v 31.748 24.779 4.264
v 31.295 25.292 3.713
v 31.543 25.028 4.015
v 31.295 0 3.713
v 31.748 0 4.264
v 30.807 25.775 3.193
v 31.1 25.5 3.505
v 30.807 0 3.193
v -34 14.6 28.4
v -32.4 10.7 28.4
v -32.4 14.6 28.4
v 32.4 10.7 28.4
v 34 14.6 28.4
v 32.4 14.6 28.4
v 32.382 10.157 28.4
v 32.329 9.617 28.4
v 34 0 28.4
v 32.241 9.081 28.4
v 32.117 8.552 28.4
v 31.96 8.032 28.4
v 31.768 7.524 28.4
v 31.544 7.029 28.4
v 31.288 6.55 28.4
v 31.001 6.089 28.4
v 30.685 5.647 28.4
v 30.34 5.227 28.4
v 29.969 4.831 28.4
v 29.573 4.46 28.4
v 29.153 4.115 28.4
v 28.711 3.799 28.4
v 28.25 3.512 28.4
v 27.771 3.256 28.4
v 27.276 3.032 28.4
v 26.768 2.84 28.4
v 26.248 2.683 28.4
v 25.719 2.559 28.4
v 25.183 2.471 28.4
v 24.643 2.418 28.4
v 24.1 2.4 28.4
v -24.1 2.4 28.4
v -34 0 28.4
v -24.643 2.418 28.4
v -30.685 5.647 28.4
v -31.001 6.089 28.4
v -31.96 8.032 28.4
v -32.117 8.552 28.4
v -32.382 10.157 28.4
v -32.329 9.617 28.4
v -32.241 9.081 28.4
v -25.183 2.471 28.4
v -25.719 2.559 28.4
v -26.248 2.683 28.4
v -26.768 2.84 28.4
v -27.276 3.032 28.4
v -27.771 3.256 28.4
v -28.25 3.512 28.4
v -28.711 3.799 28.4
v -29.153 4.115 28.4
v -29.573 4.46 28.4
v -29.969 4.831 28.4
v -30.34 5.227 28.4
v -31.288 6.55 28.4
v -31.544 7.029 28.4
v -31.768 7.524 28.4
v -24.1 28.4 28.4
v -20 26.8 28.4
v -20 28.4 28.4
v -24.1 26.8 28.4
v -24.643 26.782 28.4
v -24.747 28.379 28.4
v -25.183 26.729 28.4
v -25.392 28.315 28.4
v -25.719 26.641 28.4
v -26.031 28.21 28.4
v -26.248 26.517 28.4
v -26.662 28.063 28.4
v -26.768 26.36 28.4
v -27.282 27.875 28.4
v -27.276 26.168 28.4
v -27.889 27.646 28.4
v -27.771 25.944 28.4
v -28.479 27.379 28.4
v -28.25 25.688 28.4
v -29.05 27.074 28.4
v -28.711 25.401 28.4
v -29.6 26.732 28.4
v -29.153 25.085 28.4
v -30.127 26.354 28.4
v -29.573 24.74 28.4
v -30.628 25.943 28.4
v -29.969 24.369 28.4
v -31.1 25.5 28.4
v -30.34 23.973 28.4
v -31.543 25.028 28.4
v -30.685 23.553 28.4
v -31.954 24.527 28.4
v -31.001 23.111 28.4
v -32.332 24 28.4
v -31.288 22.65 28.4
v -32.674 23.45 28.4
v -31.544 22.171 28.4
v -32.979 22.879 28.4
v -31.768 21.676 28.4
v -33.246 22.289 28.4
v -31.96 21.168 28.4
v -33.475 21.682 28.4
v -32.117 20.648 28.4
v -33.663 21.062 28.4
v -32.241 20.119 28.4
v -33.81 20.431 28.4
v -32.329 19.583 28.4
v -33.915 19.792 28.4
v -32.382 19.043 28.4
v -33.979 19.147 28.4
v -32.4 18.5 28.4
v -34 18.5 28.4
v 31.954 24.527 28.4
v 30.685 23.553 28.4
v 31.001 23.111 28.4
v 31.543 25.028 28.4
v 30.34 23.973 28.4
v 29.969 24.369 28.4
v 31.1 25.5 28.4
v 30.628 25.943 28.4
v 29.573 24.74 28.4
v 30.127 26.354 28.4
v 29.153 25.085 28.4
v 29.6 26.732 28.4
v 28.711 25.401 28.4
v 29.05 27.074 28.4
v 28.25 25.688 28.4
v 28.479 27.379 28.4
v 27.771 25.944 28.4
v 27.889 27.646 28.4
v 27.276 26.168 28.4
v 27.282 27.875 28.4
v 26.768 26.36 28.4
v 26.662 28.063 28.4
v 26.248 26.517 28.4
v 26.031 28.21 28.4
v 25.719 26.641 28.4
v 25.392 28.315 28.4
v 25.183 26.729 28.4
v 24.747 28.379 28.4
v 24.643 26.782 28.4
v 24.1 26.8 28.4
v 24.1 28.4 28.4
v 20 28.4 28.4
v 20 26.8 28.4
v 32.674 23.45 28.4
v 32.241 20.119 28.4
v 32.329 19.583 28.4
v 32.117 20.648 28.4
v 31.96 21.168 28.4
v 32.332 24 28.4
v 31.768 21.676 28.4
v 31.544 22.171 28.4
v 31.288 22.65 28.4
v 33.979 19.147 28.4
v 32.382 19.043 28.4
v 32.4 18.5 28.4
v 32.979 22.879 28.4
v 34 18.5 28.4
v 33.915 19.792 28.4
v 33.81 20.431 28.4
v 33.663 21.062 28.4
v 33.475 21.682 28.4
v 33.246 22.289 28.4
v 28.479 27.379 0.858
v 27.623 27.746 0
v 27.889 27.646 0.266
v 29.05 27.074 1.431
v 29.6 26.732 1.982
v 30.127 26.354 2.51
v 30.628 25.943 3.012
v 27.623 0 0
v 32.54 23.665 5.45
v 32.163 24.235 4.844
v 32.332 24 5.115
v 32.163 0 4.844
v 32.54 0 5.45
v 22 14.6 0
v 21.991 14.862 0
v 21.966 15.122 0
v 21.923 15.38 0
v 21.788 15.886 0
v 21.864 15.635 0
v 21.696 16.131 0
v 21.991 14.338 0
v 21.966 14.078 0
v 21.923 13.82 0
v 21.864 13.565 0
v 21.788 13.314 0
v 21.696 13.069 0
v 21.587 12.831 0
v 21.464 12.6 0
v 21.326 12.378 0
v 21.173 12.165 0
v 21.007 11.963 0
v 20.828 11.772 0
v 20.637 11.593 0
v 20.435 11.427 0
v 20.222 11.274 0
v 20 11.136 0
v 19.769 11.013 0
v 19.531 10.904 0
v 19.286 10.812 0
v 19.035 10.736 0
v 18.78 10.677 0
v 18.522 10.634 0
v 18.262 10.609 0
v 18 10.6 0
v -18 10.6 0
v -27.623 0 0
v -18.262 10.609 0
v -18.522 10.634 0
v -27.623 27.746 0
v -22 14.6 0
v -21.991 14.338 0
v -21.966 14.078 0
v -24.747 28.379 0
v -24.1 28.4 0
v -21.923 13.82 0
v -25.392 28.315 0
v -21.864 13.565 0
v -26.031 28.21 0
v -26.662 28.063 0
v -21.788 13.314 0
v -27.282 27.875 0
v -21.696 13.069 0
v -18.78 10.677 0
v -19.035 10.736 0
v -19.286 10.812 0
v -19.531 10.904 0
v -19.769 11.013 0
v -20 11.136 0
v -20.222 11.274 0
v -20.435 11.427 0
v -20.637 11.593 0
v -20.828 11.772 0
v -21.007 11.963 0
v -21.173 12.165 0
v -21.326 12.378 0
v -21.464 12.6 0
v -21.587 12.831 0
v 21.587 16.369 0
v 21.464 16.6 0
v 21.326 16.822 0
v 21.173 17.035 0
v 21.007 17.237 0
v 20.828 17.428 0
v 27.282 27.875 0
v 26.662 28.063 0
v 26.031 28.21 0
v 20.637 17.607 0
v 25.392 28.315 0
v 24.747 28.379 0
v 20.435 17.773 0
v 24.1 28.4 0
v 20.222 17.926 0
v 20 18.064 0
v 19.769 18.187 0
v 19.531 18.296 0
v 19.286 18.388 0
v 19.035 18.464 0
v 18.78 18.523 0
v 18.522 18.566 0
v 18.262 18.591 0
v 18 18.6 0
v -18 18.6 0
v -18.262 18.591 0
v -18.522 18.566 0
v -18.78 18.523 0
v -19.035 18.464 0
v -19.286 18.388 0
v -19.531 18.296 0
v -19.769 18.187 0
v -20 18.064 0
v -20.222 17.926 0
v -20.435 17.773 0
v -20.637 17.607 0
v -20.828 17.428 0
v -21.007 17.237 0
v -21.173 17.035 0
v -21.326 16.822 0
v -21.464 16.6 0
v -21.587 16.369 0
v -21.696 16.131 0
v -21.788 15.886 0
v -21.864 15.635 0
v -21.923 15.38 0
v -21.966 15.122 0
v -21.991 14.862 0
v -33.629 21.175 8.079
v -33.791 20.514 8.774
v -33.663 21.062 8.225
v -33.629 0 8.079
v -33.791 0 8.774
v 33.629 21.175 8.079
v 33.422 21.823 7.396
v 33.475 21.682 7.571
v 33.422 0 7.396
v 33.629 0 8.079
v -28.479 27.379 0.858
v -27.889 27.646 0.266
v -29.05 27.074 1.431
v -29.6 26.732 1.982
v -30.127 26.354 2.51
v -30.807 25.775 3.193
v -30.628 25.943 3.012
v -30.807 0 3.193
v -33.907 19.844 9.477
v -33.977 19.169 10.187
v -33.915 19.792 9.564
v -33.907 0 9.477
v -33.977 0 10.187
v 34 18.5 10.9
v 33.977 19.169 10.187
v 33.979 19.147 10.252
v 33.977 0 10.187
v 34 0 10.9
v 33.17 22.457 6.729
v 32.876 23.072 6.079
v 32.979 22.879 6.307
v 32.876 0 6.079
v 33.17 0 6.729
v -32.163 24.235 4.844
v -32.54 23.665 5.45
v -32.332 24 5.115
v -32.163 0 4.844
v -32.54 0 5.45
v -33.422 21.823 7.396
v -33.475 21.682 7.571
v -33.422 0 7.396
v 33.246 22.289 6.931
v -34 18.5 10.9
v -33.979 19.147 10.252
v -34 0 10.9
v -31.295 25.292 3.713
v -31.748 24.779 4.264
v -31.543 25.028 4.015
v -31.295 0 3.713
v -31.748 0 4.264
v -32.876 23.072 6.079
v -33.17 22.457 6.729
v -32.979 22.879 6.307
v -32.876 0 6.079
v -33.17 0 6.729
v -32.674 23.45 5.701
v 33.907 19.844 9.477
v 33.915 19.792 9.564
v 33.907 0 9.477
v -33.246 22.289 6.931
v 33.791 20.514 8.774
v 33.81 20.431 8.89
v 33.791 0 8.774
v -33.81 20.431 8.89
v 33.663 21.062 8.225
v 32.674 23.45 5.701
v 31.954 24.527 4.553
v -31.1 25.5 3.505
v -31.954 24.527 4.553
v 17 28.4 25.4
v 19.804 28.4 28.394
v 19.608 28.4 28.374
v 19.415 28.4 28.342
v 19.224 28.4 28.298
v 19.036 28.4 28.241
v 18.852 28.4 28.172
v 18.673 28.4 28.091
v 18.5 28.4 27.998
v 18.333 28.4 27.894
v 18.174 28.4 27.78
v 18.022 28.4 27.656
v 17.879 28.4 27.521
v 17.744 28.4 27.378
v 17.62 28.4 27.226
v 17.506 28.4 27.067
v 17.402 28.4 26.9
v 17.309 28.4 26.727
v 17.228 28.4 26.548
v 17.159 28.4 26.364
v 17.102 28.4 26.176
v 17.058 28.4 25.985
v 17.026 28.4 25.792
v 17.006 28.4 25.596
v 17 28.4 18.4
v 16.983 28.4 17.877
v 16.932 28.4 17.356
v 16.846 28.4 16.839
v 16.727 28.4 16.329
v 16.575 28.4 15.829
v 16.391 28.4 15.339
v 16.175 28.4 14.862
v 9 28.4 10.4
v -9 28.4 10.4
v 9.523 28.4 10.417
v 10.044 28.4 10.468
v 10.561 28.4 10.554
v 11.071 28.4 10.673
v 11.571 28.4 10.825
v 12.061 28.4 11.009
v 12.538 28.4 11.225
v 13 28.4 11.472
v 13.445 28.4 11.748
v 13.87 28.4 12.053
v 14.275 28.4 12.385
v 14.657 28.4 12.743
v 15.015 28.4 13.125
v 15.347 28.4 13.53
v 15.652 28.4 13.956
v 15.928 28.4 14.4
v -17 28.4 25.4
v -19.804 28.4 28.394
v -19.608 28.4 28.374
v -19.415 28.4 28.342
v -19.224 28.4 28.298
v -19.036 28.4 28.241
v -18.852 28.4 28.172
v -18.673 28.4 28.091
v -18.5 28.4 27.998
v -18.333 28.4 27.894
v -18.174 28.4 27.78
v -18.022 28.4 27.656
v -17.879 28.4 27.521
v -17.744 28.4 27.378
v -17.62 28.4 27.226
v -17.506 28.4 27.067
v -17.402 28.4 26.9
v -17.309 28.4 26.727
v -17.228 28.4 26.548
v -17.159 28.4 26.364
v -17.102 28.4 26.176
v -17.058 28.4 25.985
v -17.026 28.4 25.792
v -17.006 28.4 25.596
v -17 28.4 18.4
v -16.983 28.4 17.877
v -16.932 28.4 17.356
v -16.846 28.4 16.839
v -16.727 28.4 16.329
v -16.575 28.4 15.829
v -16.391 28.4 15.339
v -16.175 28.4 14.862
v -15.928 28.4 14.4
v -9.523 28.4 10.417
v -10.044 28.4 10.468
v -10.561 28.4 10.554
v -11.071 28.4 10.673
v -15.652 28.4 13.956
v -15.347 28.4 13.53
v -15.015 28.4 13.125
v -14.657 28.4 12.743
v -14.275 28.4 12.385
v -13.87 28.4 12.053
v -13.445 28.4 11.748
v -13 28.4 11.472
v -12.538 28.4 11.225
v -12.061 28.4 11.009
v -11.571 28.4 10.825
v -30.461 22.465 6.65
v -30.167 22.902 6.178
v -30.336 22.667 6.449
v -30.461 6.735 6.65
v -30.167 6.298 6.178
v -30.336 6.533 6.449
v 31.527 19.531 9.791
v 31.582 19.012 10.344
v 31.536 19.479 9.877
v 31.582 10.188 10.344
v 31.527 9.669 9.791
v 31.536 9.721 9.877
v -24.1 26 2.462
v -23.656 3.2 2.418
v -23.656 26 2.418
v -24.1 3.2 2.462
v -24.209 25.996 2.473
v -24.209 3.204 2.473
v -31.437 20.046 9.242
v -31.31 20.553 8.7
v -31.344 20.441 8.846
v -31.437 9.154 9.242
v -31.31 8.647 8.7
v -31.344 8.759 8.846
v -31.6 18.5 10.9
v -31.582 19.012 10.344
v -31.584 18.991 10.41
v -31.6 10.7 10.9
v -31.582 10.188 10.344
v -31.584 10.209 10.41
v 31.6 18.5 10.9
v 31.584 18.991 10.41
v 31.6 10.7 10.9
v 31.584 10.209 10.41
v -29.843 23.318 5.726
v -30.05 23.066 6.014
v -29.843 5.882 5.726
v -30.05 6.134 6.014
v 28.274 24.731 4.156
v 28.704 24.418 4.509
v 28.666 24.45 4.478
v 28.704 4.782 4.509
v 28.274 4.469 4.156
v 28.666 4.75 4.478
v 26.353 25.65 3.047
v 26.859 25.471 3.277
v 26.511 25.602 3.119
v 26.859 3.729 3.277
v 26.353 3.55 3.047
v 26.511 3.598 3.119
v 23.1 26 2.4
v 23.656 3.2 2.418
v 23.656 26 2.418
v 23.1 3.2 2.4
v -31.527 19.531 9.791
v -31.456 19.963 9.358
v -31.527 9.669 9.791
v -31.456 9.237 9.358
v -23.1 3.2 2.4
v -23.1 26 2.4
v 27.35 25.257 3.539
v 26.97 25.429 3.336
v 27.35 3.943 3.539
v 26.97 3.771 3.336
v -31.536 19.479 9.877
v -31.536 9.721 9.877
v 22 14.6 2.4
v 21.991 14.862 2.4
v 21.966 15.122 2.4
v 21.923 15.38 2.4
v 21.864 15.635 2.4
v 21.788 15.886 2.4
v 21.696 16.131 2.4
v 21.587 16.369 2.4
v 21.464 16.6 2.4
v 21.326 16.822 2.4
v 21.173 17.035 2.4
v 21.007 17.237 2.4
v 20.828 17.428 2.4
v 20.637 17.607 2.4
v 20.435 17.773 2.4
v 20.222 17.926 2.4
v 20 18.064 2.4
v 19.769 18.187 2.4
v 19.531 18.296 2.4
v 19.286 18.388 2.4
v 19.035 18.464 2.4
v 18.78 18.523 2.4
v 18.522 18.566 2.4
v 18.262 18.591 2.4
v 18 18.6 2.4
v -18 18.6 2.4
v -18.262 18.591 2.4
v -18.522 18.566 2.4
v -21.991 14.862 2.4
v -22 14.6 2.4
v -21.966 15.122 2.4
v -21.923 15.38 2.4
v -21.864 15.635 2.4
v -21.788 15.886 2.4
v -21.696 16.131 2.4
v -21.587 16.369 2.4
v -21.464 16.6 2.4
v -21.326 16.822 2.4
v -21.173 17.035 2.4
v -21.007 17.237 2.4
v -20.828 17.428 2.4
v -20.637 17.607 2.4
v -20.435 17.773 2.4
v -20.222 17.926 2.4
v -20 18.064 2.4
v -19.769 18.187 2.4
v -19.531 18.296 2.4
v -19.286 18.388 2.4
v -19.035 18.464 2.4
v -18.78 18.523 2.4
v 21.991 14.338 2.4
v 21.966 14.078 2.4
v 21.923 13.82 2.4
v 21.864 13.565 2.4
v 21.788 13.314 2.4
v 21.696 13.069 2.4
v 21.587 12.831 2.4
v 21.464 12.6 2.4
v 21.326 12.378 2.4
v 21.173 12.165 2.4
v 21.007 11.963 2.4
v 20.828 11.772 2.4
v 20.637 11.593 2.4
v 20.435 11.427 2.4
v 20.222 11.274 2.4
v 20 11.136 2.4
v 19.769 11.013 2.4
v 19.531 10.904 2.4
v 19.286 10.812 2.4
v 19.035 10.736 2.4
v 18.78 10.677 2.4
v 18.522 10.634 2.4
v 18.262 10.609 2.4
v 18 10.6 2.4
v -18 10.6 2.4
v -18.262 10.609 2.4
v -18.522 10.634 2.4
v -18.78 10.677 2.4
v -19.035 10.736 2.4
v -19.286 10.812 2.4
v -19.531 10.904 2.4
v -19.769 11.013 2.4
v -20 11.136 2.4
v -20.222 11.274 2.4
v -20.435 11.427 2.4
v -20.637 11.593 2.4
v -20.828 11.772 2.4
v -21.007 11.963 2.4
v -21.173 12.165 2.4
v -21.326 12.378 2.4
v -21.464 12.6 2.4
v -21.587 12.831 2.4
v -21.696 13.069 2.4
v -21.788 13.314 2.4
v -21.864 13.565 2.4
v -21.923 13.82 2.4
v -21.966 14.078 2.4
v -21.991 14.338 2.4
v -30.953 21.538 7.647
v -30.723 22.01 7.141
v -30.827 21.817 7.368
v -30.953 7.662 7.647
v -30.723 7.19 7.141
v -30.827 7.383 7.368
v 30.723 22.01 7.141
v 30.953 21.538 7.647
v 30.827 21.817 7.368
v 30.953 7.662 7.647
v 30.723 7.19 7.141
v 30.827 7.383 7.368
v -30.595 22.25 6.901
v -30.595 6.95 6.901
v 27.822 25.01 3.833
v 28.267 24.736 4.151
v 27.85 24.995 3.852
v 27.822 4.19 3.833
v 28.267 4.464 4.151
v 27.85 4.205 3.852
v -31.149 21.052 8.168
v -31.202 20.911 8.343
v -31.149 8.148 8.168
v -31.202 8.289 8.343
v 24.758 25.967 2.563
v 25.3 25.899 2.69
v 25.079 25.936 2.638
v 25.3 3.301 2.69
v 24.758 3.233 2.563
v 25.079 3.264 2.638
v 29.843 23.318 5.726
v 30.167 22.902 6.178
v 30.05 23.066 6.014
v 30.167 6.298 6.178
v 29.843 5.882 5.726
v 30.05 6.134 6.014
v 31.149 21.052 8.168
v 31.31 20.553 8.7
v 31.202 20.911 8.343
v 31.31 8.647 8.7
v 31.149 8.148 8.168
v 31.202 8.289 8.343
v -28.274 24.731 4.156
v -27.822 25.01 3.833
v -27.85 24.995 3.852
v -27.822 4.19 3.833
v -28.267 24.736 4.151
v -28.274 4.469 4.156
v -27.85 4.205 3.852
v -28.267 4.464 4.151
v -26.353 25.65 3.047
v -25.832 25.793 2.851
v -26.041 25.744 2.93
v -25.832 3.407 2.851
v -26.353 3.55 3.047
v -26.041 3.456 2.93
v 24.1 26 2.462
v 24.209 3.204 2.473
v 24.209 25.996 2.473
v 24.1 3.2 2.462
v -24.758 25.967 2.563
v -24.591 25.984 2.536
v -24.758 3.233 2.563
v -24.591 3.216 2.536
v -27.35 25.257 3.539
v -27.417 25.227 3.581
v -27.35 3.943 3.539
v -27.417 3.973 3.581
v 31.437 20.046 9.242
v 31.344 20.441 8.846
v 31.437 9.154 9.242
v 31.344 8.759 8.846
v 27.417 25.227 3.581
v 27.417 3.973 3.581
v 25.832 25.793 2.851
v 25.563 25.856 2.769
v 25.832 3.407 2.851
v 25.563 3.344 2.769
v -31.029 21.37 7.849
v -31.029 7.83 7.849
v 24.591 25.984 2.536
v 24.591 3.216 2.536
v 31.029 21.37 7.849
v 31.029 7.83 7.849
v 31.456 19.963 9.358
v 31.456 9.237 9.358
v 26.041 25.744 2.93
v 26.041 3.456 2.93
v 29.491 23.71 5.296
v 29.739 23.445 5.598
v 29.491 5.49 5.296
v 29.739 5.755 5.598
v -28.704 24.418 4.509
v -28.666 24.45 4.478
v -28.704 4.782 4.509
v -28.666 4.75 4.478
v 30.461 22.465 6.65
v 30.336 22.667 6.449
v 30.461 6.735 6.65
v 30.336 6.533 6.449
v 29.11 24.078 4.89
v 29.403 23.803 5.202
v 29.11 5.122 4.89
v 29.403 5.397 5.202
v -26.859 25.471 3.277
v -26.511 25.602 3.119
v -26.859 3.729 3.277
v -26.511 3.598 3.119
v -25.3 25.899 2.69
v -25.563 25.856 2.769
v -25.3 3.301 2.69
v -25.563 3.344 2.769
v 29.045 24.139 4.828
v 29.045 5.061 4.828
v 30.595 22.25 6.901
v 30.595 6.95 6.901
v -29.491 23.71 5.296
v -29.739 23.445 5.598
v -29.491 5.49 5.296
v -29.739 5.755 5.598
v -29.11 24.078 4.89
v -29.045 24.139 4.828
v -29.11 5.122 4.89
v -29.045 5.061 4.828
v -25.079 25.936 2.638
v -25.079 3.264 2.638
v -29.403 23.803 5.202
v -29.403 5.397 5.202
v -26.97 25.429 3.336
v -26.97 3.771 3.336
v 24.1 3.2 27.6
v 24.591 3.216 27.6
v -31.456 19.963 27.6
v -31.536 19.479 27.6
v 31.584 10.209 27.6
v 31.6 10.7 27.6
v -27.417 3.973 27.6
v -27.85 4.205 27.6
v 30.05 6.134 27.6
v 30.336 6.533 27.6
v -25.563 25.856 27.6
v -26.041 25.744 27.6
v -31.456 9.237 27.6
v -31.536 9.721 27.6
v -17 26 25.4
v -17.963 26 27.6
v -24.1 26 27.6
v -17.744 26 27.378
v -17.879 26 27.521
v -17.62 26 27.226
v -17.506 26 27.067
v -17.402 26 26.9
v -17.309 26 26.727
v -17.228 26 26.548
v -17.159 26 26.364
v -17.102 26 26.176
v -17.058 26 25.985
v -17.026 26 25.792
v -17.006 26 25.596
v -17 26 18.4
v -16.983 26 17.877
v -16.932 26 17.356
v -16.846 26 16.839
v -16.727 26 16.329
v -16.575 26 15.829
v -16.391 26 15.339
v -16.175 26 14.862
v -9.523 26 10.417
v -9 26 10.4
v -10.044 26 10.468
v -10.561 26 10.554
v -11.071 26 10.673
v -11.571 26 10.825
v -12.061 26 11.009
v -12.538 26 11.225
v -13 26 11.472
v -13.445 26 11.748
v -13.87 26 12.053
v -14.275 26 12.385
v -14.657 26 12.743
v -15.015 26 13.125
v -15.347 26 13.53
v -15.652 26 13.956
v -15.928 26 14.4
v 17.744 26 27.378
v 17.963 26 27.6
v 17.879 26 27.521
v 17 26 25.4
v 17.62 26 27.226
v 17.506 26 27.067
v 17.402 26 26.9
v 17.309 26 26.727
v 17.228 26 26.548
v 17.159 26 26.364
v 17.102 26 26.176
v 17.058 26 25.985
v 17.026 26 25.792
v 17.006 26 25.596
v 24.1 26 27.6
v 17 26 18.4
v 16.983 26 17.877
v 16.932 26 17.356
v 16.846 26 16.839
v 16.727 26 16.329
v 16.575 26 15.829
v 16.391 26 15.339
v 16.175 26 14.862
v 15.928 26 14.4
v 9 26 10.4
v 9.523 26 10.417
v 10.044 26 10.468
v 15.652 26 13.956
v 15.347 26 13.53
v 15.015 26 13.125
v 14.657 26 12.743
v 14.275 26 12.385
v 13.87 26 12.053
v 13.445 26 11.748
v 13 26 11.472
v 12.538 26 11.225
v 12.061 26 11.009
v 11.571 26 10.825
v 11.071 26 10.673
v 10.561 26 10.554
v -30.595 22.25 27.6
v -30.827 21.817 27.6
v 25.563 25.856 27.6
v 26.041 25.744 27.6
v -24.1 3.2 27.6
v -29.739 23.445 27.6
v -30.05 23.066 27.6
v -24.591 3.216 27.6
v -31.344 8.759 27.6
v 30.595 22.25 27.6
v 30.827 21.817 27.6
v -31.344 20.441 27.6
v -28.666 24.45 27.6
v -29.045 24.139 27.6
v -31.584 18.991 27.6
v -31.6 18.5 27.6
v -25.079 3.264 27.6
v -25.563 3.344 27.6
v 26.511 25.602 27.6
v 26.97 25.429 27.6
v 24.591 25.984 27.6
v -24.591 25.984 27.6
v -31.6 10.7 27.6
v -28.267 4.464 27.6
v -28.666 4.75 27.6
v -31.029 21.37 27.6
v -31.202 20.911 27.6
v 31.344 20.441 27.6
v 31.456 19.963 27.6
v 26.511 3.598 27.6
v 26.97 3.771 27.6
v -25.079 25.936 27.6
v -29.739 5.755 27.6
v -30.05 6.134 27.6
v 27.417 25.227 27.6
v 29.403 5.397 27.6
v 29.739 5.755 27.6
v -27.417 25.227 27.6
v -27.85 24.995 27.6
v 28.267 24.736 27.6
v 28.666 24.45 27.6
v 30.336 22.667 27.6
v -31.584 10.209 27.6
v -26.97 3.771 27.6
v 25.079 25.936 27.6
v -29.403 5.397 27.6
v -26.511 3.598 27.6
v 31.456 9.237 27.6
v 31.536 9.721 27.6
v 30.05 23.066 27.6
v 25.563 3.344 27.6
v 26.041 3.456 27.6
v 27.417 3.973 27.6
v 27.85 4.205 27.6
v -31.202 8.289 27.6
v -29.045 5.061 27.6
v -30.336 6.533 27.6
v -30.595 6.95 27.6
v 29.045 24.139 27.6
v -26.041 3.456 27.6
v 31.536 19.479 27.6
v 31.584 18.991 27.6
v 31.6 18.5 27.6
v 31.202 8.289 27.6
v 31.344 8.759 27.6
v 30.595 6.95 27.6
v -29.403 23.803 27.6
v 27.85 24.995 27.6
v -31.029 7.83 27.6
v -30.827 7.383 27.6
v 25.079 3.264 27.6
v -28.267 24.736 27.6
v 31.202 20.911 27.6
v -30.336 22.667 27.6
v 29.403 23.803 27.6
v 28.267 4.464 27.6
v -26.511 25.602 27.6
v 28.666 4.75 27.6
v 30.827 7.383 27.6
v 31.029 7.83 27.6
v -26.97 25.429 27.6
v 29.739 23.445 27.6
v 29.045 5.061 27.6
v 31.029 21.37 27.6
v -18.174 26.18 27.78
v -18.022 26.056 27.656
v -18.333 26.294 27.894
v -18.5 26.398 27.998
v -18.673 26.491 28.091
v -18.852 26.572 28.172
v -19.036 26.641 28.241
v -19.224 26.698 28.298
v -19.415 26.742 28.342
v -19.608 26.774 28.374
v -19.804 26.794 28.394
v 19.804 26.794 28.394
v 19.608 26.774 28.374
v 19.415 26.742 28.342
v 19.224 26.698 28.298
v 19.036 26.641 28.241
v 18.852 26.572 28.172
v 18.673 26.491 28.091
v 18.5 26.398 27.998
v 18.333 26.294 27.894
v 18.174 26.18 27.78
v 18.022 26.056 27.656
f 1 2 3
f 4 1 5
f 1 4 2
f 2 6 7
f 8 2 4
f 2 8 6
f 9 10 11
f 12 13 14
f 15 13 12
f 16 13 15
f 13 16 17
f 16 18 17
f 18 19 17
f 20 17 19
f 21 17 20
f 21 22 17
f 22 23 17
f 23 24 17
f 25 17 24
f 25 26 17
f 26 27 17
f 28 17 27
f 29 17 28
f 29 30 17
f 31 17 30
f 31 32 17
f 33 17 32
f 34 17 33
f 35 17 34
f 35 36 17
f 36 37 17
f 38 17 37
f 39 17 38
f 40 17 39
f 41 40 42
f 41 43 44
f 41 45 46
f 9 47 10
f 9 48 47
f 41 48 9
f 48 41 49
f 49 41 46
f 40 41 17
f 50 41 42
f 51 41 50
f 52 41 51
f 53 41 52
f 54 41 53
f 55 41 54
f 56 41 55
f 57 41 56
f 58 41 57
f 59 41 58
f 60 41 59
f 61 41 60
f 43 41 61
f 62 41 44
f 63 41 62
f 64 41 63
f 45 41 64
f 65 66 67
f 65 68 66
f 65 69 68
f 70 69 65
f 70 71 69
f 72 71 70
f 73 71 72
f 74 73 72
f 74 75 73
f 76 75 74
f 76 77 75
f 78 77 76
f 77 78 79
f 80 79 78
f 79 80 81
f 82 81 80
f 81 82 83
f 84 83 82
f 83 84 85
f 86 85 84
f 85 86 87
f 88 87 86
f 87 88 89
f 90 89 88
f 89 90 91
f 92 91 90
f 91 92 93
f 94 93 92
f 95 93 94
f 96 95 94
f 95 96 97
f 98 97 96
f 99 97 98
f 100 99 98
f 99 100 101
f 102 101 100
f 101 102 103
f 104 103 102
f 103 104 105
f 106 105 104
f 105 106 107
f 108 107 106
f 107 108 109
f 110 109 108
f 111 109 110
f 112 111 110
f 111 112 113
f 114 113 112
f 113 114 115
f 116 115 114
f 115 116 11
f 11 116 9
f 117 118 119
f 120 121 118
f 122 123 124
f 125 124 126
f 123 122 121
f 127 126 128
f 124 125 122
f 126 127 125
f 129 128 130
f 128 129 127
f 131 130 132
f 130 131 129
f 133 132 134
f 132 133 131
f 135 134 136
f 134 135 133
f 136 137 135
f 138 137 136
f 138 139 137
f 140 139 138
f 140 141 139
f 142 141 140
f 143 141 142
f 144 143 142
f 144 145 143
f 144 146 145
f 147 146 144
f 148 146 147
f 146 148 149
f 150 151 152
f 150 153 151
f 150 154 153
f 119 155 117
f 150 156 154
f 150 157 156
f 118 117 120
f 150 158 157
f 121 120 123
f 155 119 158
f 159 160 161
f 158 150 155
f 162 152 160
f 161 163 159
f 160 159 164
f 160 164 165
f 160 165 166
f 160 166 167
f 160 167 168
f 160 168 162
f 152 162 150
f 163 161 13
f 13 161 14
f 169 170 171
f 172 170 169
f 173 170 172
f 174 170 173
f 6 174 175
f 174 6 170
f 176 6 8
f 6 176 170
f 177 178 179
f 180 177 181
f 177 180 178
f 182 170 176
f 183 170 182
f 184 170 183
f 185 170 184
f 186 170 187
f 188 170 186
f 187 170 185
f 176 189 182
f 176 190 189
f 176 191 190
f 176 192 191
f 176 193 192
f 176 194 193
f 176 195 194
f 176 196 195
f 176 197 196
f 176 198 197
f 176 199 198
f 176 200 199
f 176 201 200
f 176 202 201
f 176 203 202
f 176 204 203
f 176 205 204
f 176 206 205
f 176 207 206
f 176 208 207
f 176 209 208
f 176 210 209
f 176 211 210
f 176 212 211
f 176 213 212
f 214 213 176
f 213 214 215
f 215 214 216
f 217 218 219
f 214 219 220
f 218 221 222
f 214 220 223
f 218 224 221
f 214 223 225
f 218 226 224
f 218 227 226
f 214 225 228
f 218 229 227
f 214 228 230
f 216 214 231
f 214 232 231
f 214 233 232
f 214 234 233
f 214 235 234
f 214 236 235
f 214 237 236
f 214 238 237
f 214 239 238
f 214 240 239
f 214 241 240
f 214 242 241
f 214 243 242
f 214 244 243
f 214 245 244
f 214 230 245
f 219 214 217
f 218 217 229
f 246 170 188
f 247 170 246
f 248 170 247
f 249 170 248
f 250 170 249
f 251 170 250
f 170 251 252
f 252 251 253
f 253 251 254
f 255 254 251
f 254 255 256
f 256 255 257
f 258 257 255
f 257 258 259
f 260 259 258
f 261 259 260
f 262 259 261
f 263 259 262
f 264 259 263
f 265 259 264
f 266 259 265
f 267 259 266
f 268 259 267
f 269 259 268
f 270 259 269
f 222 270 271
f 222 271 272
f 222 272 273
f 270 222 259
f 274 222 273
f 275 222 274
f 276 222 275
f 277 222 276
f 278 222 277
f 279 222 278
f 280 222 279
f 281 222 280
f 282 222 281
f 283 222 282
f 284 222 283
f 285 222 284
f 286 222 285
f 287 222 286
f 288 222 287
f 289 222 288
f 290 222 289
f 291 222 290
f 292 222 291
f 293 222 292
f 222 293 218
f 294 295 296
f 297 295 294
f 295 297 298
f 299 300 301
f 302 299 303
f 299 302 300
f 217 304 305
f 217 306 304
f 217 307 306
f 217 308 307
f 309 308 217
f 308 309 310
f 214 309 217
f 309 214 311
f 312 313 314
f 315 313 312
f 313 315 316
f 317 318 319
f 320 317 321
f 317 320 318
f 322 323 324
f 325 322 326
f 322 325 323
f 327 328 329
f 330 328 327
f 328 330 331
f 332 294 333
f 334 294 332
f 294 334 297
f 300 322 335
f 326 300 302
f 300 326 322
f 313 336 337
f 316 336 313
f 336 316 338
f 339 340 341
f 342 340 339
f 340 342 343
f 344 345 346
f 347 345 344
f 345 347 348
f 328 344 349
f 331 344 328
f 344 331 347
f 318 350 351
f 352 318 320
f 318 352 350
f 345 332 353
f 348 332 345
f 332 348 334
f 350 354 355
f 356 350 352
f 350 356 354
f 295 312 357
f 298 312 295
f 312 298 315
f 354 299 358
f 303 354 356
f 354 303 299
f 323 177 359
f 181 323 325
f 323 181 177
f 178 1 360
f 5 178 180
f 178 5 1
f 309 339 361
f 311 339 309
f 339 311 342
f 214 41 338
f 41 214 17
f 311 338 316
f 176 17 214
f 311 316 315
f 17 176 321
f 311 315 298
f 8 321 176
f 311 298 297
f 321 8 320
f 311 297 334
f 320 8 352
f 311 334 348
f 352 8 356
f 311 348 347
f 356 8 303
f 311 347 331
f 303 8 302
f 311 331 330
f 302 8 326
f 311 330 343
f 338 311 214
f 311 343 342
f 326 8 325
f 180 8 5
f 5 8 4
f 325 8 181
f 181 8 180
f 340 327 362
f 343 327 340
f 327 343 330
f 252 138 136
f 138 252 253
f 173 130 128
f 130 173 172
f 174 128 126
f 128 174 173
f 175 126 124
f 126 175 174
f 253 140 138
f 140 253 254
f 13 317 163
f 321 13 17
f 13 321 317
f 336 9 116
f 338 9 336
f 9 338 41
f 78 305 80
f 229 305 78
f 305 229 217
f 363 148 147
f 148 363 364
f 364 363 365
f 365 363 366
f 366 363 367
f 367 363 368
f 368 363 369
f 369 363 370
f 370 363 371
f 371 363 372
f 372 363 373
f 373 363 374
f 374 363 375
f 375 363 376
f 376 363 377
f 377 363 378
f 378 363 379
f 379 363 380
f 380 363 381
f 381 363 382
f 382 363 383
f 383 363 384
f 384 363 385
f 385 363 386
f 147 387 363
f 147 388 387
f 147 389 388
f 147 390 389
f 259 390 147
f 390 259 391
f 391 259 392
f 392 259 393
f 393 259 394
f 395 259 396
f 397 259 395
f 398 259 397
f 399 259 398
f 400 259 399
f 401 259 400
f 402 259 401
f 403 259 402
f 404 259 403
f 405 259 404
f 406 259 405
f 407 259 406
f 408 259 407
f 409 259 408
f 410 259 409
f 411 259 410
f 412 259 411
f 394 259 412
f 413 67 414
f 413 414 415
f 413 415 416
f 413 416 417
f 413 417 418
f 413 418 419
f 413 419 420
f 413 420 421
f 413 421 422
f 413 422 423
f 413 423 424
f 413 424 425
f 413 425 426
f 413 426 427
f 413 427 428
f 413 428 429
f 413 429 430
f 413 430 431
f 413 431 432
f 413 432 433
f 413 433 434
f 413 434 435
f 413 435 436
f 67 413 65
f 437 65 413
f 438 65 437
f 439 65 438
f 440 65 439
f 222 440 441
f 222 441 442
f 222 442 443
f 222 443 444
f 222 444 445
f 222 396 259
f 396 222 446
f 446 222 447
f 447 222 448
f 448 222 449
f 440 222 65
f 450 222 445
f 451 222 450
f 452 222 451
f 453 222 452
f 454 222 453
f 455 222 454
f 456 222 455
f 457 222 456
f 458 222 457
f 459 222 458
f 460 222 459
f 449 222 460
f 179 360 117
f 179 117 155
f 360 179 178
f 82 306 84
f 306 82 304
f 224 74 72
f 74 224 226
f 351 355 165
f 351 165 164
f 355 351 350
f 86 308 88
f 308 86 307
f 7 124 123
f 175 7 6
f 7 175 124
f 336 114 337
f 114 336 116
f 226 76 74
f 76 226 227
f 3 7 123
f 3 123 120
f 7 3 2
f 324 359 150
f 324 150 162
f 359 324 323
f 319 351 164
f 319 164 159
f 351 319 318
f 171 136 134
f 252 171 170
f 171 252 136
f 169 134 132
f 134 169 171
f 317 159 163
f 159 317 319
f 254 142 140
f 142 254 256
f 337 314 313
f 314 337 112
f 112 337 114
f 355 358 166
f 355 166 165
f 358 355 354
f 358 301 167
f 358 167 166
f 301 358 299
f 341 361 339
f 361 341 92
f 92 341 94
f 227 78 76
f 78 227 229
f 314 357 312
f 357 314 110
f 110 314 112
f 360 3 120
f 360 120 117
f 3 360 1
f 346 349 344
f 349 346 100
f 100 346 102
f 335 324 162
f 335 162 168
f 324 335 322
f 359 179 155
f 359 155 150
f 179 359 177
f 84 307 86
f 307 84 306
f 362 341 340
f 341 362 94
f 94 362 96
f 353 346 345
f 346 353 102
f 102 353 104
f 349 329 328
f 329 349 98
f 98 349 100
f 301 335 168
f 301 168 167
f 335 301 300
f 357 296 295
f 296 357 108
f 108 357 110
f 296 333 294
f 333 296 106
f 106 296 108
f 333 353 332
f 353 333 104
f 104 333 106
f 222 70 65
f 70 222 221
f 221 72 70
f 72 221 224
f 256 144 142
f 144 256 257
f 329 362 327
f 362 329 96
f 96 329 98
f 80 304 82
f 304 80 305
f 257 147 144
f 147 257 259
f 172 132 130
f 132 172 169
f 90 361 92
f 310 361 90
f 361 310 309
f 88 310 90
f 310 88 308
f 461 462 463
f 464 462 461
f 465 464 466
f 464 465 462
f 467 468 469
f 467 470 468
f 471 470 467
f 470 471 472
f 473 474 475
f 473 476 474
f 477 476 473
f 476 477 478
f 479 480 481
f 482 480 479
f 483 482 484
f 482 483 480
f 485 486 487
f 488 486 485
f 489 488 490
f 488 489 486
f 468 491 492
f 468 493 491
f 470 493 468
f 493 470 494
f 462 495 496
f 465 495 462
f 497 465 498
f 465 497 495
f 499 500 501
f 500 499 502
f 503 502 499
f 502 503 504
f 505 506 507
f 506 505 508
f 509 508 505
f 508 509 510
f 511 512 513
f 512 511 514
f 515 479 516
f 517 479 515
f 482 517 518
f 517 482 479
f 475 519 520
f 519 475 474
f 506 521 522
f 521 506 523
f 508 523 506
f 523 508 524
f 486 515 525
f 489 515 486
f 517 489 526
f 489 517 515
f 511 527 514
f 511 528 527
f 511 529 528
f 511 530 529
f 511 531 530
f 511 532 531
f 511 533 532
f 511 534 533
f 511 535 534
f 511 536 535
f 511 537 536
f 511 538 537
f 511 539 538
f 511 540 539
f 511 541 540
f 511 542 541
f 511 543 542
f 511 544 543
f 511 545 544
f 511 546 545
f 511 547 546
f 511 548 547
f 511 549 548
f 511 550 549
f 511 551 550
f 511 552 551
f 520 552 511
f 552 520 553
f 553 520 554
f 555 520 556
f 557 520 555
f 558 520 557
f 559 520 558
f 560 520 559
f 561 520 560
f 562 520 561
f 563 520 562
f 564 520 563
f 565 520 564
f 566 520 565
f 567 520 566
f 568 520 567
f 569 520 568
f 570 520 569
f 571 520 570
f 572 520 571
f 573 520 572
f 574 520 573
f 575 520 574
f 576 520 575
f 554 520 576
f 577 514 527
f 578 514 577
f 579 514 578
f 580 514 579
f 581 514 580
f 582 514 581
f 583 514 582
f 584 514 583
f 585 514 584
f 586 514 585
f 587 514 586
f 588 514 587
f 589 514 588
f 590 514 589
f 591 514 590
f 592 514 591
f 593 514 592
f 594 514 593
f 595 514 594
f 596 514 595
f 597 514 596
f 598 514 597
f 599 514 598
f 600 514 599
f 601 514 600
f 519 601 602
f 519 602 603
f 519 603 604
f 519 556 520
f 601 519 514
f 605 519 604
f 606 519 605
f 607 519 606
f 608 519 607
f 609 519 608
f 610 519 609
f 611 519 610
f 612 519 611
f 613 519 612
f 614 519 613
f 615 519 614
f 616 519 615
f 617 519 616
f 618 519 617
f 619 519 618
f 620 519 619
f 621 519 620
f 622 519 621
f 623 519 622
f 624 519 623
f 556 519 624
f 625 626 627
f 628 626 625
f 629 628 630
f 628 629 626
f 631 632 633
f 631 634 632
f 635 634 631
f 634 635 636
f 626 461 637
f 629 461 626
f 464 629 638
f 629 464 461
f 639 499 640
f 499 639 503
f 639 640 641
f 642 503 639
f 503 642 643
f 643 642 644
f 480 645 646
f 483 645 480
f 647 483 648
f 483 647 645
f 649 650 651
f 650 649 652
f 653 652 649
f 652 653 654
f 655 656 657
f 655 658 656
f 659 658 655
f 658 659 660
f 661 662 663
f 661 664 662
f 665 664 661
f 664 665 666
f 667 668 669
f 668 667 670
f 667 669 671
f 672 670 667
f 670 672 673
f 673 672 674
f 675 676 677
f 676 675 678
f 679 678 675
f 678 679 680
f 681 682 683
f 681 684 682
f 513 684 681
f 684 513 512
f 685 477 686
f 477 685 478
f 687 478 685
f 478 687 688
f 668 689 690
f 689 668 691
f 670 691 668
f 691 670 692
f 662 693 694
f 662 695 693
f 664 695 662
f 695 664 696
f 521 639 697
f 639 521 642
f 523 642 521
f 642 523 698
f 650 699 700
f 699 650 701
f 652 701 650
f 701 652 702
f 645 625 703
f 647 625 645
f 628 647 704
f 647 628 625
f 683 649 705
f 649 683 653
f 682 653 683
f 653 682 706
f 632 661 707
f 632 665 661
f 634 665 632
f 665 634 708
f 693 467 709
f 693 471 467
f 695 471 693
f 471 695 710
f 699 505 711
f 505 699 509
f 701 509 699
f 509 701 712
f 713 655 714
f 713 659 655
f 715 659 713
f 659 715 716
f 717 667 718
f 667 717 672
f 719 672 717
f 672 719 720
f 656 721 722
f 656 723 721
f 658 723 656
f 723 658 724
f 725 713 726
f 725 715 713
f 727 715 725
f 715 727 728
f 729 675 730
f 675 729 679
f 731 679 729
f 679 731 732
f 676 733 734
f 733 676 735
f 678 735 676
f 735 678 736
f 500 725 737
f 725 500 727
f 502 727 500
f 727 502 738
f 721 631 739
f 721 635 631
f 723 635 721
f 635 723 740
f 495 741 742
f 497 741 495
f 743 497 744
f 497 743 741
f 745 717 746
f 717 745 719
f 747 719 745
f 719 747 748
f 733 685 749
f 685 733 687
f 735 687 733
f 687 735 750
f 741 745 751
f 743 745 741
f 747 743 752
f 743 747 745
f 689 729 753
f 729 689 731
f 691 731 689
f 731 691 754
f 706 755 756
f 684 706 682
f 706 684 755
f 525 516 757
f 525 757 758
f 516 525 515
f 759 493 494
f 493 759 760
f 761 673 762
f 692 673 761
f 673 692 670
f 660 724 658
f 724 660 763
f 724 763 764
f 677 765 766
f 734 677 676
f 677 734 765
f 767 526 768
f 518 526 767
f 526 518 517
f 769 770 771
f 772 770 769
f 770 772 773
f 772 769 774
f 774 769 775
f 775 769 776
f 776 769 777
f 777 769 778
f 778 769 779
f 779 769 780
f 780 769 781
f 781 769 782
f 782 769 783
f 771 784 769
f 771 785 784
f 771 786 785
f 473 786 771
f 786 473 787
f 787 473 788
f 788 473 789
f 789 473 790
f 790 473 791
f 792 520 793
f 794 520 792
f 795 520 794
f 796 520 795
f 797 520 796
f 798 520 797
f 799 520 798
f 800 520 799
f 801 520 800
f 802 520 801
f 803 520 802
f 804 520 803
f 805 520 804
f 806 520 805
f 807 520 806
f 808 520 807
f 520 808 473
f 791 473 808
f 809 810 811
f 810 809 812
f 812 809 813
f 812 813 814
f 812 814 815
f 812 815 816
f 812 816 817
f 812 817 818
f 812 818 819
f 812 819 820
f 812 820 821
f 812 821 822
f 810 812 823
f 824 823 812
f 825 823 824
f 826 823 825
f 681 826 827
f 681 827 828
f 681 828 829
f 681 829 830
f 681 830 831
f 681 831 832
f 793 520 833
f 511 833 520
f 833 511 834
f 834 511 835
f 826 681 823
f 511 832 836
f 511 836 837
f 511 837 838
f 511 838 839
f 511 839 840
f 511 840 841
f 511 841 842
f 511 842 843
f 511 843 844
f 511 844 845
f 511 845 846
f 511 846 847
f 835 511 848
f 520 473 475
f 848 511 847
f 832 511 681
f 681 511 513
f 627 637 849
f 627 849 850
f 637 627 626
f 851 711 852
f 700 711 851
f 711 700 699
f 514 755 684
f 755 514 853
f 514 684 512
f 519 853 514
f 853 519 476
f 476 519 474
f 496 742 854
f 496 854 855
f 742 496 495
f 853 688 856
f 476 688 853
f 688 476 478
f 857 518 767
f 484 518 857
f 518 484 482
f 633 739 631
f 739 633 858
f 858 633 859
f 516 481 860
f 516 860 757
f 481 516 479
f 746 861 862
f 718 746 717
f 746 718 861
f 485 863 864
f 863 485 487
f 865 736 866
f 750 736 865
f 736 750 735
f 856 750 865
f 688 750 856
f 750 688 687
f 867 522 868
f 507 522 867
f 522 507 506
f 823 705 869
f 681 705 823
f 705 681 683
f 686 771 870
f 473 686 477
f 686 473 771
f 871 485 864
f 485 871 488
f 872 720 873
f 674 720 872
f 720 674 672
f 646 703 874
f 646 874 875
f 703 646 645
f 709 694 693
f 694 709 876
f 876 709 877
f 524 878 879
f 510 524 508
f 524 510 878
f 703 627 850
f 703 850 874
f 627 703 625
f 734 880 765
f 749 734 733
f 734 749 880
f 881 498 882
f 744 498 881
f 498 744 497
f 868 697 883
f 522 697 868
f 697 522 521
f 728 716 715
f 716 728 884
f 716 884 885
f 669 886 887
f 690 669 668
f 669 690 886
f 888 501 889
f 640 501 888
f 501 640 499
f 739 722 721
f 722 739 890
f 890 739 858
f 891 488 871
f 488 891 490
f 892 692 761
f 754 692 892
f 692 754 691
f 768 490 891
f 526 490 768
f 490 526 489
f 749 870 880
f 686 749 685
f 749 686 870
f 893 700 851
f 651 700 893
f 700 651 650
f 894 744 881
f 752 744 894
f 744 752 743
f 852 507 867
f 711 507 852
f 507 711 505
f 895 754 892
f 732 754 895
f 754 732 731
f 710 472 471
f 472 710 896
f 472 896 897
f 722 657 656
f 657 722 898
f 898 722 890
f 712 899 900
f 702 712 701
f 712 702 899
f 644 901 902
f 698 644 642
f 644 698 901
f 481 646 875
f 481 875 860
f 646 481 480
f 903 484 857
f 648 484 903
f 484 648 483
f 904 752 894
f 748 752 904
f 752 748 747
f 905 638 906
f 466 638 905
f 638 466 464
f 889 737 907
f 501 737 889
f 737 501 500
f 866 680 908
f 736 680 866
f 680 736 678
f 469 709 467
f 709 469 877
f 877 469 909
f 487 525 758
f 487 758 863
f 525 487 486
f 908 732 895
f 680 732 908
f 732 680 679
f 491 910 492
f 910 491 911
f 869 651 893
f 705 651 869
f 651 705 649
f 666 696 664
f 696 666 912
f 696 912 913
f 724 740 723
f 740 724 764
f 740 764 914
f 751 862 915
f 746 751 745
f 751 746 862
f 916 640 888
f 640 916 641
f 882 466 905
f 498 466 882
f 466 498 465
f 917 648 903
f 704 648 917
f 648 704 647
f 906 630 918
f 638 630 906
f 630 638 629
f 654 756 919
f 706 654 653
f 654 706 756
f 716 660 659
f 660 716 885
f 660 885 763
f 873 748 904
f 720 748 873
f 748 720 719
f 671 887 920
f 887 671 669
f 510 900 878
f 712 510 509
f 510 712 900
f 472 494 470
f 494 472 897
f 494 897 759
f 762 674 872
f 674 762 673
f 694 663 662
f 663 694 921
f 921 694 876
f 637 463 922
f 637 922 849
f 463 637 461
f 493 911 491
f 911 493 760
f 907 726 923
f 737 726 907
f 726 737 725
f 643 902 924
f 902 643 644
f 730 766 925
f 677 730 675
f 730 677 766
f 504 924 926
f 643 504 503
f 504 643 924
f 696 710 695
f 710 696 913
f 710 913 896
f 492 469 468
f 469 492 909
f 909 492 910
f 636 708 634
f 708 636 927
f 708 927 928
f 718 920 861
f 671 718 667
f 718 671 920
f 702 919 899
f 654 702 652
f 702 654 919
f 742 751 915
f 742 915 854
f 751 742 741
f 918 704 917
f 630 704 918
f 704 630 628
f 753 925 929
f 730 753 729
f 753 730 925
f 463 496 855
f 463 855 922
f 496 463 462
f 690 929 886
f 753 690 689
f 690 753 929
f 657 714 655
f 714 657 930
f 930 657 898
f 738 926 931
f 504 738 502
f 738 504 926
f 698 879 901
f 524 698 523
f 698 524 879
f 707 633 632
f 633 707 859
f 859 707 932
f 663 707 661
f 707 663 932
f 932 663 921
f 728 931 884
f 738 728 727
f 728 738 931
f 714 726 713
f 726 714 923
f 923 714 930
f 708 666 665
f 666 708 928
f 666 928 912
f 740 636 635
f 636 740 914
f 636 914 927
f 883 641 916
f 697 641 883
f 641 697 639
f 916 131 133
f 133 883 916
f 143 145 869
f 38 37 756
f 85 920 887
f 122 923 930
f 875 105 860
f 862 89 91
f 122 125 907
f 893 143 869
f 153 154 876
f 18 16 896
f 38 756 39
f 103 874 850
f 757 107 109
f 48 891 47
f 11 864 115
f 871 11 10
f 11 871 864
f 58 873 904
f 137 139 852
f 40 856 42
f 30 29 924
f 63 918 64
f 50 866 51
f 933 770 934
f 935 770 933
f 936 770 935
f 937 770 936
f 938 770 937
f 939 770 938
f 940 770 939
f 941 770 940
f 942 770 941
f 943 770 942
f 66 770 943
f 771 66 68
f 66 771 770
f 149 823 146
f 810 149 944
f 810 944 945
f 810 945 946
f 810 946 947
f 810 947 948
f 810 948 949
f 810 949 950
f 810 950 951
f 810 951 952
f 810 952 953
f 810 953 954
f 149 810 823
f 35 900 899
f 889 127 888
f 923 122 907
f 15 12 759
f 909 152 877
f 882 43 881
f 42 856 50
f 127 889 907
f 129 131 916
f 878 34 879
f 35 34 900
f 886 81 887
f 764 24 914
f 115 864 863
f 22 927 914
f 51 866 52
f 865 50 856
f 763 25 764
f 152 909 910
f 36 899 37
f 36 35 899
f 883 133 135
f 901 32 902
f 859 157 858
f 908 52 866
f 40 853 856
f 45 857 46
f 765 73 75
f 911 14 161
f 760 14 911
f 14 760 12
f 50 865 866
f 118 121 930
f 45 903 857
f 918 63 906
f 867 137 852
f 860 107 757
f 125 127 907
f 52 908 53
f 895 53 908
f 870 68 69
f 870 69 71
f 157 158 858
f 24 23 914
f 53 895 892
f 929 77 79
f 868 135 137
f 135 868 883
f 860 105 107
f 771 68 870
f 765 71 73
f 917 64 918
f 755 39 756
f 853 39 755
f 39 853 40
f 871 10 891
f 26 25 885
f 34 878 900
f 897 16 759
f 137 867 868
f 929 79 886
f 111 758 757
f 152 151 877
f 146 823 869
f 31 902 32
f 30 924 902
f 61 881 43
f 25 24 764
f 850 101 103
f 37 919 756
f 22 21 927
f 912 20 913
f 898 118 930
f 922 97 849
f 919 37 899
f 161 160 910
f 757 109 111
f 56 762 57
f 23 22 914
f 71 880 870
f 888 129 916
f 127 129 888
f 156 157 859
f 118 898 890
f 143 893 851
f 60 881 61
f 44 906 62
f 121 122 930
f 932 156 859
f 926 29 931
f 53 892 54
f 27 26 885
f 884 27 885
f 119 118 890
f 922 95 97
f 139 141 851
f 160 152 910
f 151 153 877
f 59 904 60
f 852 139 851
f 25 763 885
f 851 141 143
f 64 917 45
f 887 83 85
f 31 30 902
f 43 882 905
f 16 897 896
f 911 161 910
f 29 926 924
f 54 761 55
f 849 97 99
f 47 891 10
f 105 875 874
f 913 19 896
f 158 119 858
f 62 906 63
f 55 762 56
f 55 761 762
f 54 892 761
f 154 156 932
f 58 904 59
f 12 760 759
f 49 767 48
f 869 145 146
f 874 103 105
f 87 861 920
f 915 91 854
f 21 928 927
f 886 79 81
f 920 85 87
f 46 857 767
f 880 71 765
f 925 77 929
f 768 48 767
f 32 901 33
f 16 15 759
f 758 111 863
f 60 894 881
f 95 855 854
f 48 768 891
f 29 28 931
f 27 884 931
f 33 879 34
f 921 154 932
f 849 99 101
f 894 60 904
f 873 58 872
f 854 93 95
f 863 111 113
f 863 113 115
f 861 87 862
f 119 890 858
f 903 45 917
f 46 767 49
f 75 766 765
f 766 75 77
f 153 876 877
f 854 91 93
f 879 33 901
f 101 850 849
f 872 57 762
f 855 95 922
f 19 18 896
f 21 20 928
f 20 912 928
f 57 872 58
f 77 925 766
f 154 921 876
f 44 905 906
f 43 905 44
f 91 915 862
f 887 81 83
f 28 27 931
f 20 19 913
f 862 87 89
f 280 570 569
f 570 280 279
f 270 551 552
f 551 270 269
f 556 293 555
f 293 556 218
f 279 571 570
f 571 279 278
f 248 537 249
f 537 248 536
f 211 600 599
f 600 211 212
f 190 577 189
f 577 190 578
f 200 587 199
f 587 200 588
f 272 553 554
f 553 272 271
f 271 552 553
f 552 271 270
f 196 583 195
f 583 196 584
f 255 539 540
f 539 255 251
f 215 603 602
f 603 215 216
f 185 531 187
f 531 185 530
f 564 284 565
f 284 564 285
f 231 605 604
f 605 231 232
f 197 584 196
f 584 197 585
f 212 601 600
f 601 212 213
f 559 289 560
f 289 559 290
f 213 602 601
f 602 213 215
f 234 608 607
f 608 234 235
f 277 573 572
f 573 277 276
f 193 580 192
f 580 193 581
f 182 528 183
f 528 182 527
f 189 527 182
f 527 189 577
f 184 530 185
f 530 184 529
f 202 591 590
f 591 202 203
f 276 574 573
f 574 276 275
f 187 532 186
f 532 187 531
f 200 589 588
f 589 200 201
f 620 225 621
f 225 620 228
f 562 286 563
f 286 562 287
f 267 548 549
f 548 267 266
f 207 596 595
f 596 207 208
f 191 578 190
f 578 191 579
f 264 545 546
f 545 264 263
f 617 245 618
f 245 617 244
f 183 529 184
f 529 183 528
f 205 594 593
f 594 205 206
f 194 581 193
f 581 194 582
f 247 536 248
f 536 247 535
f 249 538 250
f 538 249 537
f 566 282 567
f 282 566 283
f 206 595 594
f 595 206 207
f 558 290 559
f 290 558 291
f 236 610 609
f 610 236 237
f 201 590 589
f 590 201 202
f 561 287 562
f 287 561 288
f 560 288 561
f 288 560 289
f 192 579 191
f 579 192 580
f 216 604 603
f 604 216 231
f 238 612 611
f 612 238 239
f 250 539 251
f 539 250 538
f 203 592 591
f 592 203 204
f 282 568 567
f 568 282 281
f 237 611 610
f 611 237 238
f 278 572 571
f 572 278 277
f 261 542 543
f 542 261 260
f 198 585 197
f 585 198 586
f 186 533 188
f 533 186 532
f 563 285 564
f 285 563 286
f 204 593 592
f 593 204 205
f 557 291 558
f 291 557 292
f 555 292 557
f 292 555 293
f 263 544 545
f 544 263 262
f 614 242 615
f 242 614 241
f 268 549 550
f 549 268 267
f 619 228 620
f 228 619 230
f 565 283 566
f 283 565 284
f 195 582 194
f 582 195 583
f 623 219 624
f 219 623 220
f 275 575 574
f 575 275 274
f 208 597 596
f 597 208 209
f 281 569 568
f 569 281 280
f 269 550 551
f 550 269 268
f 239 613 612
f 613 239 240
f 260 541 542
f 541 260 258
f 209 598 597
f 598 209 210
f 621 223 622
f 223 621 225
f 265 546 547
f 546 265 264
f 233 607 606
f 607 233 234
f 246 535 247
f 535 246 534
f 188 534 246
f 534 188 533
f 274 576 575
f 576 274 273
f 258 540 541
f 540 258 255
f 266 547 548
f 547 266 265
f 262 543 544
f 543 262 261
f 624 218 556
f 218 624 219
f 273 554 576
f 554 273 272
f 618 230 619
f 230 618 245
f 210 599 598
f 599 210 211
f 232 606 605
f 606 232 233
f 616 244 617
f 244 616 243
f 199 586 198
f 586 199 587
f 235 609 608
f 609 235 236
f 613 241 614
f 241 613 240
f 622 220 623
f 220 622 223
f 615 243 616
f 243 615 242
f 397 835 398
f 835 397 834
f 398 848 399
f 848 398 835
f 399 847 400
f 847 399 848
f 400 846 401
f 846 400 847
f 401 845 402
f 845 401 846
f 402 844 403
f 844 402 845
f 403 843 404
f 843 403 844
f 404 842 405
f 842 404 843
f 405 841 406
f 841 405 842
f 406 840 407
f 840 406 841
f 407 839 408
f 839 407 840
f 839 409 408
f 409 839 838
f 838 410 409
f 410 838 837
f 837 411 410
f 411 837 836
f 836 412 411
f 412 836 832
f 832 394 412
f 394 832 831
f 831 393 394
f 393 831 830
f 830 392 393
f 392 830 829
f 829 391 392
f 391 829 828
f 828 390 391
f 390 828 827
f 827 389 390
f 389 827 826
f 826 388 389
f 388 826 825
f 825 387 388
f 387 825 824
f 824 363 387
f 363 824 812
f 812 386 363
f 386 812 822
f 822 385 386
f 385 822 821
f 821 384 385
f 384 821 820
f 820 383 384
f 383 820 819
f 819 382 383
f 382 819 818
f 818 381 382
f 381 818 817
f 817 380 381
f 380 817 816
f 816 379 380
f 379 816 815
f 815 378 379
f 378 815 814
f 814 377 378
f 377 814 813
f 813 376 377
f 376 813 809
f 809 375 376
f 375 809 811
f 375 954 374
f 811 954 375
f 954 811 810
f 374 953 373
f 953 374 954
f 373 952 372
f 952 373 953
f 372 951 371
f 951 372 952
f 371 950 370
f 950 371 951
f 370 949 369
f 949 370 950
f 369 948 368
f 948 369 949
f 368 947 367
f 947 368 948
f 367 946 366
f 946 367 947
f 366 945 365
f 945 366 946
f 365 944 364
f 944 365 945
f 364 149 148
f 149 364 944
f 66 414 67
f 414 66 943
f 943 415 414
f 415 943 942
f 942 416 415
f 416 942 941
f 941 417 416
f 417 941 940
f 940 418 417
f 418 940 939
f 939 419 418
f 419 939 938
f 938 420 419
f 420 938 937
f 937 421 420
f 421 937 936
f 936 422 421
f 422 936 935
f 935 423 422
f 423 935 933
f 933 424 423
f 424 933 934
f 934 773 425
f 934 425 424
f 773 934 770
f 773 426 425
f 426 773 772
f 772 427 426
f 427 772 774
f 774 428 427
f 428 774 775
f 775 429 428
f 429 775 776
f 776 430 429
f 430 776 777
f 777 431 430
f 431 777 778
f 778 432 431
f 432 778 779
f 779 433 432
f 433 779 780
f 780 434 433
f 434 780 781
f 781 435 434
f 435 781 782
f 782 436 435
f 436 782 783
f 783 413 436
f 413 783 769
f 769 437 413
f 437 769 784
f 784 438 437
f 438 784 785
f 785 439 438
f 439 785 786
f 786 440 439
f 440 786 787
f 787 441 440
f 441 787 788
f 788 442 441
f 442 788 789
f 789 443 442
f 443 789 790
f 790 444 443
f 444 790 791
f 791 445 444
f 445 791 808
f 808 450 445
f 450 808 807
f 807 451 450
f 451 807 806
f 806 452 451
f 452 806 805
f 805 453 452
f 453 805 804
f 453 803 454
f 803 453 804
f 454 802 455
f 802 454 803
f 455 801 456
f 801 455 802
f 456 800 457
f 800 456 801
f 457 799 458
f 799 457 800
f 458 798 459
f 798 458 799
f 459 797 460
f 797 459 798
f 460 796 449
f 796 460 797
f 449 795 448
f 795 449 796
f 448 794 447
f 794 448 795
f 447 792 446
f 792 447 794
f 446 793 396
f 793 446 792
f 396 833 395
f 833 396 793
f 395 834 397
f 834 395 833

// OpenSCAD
// =====================================================================
//  AirPods Pro 3 Halter fürs Bett / die Wand
//  - Spalt im Boden: Staub und Krümel fallen durch statt sich zu sammeln
//  - 3 Befestigungen: Klebeband, versenkte Schrauben, Bettrahmen-Clip
//  - Deckel lässt sich im Halter aufklappen (Wände bleiben unter der Deckelfuge)
//
//  Gedruckt wird aufrecht (Boden auf dem Druckbett), ohne Stützmaterial.
//  Kompatibel mit dem MakerWorld "Parametric Model Maker" (OpenSCAD-Customizer).
// =====================================================================

/* [Befestigung] */
// Wie soll der Halter befestigt werden?
befestigung = "klebeband"; // [klebeband:Doppelseitiges Klebeband, schraube:Schrauben (versenkt), clip:Bettrahmen-Clip zum Einhängen]

/* [Bettrahmen-Clip] */
// Dicke des Bettrahmens / Kopfteils, über den der Clip gehängt wird (mm)
rahmen_dicke = 25; // [10:0.5:60]
// Zusätzliches Spiel im Clip (mm)
clip_spiel = 0.6; // [0:0.1:2]
// Stärke von Steg und hinterem Bein (mm)
clip_staerke = 3.5; // [2.5:0.5:6]

/* [Schrauben] */
// Schraubendurchmesser (mm), z. B. 3,5 oder 4 mm Holzschraube
schraube_d = 4; // [3:0.5:5]
// Kopfdurchmesser der Senkkopfschraube (mm)
schraube_kopf_d = 8; // [5:0.5:10]
// Abstand der beiden Schrauben (mm)
schraube_abstand = 20; // [10:1:26]

/* [AirPods-Case] */
// Breite des Ladecase (Apple-Angabe: 62,2 mm)
case_breite = 62.2; // [55:0.1:70]
// Tiefe des Ladecase (Apple-Angabe: 21,8 mm)
case_tiefe = 21.8; // [18:0.1:28]
// Spiel pro Seite (mm)
spiel = 0.5; // [0.2:0.1:1.5]
// Dicke einer Schutzhülle, falls du eine benutzt (mm, 0 = ohne Hülle)
huelle = 0; // [0:0.1:3]

/* [Halter] */
// Seitenwand-Stärke (mm)
wand = 2.4; // [1.6:0.2:4]
// Boden-Stärke (mm)
boden = 2.4; // [1.6:0.2:4]
// Rückwand-Stärke (mm)
rueckwand = 3.2; // [2.4:0.2:6]
// Wandhöhe über dem Boden (mm). Bis ca. 28 mm lässt sich der Deckel im Halter aufklappen.
wand_hoehe = 26; // [15:1:40]
// Breite des Spalts im Boden (mm), 0 = kein Spalt
spalt_breite = 8; // [0:0.5:12]
// Länge des Spalts im Boden (mm)
spalt_laenge = 44; // [10:1:50]
// Breite des Ausschnitts vorne (mm)
front_breite = 34; // [20:1:44]
// Höhe der vorderen Lippe über dem Boden (mm)
front_lippe = 8; // [4:1:20]

/* [Hidden] */
$fn = 96;
eps = 0.01;

// ---------------------------------------------------------------------
// Abgeleitete Maße
// ---------------------------------------------------------------------
gap = spiel + huelle;
W   = case_breite + 2 * gap;        // Innenbreite
D   = case_tiefe  + 2 * gap;        // Innentiefe
R_f = 8 + gap;                      // Eckenradius unten (Frontansicht), kleiner als am Case
R_t = 7 + gap;                      // Eckenradius (Draufsicht), kleiner als am Case
H   = boden + wand_hoehe;           // Gesamthöhe

// Senkkopf braucht etwas Fleisch: Rückwand bei Schraubversion ggf. dicker
senk_tiefe = (schraube_kopf_d + 0.4 - (schraube_d + 0.3)) / 2;
rw = (befestigung == "schraube") ? max(rueckwand, senk_tiefe + 0.3 + 1.2) : rueckwand;

y0 = rw;                            // Innenseite Rückwand
Wo = W + 2 * wand;                  // Außenbreite
Do = rw + D + wand;                 // Außentiefe

spalt_L = min(spalt_laenge, W - 2 * R_f);
spalt_B = min(spalt_breite, D - 8);

// ---------------------------------------------------------------------
// Hilfsmodule
// ---------------------------------------------------------------------
// zentriertes Rechteck mit runden Ecken
module rrect(w, d, r) {
    offset(r = r) square([w - 2 * r, d - 2 * r], center = true);
}

// 2D-Form (x,z) entlang Y von a bis b extrudieren
module extrude_y(a, b) {
    translate([0, b, 0]) rotate([90, 0, 0]) linear_extrude(b - a) children();
}

// Kreis mit 45°-Spitze nach unten -> druckbar ohne Überhang
module teardrop2d(r) {
    hull() {
        circle(r = r);
        translate([0, -r * sqrt(2)]) square(0.02, center = true);
    }
}

// ---------------------------------------------------------------------
// Geometrie
// ---------------------------------------------------------------------
// Frontansicht der Tasche: unten abgerundet, oben offen
module pocket_front2d() {
    hull() {
        for (s = [-1, 1]) translate([s * (W / 2 - R_f), boden + R_f]) circle(r = R_f);
        translate([-W / 2, boden + R_f]) square([W, H]);
    }
}

// Frontansicht außen: runde Kanten, unten 45° auslaufend, flacher Fuß
module outer_front2d() {
    intersection() {
        translate([-Wo / 2 - 1, 0]) square([Wo + 2, H]);
        hull() {
            for (s = [-1, 1]) translate([s * (W / 2 - R_f), boden + R_f]) teardrop2d(R_f + wand);
            translate([-Wo / 2, boden + R_f]) square([Wo, H]);
            translate([-(W / 2 - R_f), 0]) square([W - 2 * R_f, 1]);
        }
    }
}

// Draufsicht außen: vorne rund, hinten komplett flach (Klebefläche)
module outer_top2d() {
    intersection() {
        hull() {
            translate([0, y0 + D / 2]) rrect(W + 2 * wand, D + 2 * wand, R_t + wand);
            translate([-Wo / 2, 0]) square([Wo, y0 + D / 2]);
        }
        translate([-Wo, 0]) square([2 * Wo, 2 * Do]);
    }
}

module body() {
    intersection() {
        extrude_y(0, Do) outer_front2d();
        linear_extrude(H) outer_top2d();
    }
}

module pocket() {
    intersection() {
        extrude_y(y0 - 1, y0 + D + 1) pocket_front2d();
        translate([0, 0, boden - 1]) linear_extrude(H + 10)
            translate([0, y0 + D / 2]) rrect(W, D, R_t);
    }
    // Einführschräge oben
    c = 0.8;
    hull() {
        translate([0, 0, H - c]) linear_extrude(eps) translate([0, y0 + D / 2]) rrect(W, D, R_t);
        translate([0, 0, H]) linear_extrude(1) translate([0, y0 + D / 2]) rrect(W + 2 * c, D + 2 * c, R_t + c);
    }
}

// Spalt im Boden gegen Staub & Krümel
module bottom_slot() {
    if (spalt_B > 0)
        translate([0, y0 + D / 2, -1]) linear_extrude(boden + 2)
            hull() for (s = [-1, 1]) translate([s * (spalt_L / 2 - spalt_B / 2), 0]) circle(d = spalt_B);
}

// U-förmiger Ausschnitt vorne (Greifen, LED sichtbar)
module front_cut() {
    fz  = boden + front_lippe;
    r_u = min(front_breite / 2, 8);
    rf  = 3;
    extrude_y(y0 + D / 2, Do + 1)
        offset(r = -rf) offset(delta = rf) union() {
            hull() {
                for (s = [-1, 1]) translate([s * (front_breite / 2 - r_u), fz + r_u]) circle(r = r_u);
                translate([-front_breite / 2, fz + r_u]) square([front_breite, H + 10]);
            }
            translate([-Wo, H]) square([2 * Wo, 10]);
        }
}

// Zwei versenkte Schraubenlöcher in der Rückwand
// (Zugang mit dem Schraubendreher durch den Front-Ausschnitt)
module screw_holes() {
    zc  = boden + front_lippe + (wand_hoehe - front_lippe) / 2;
    d_l = schraube_d + 0.3;
    d_k = schraube_kopf_d + 0.4;
    k   = (d_k - d_l) / 2;
    for (s = [-1, 1]) translate([s * schraube_abstand / 2, 0, zc]) rotate([-90, 0, 0]) {
        translate([0, 0, -1]) cylinder(d = d_l, h = rw + 2);
        translate([0, 0, rw - 0.3 - k]) cylinder(d1 = d_l, d2 = d_k, h = k + eps);
        translate([0, 0, rw - 0.3]) cylinder(d = d_k, h = 2);
    }
}

// U-Haken zum Einhängen über Bettrahmen / Kopfteil
// (Steg oben bündig mit der Wandoberkante, damit der Deckel frei bleibt)
module clip() {
    T  = rahmen_dicke + clip_spiel;
    t  = clip_staerke;
    yb = -(T + t);
    difference() {
        intersection() {
            extrude_y(yb, 0.5) outer_front2d();
            linear_extrude(H) hull() {
                translate([-Wo / 2, 0]) square([Wo, 0.5]);
                for (s = [-1, 1]) translate([s * (Wo / 2 - 2), yb + 2]) circle(r = 2);
            }
        }
        translate([-Wo, -T, -1]) cube([2 * Wo, T, H - t + 1]);
    }
}

module halter() {
    difference() {
        union() {
            body();
            if (befestigung == "clip") clip();
        }
        pocket();
        bottom_slot();
        front_cut();
        if (befestigung == "schraube") screw_holes();
    }
}

halter();
